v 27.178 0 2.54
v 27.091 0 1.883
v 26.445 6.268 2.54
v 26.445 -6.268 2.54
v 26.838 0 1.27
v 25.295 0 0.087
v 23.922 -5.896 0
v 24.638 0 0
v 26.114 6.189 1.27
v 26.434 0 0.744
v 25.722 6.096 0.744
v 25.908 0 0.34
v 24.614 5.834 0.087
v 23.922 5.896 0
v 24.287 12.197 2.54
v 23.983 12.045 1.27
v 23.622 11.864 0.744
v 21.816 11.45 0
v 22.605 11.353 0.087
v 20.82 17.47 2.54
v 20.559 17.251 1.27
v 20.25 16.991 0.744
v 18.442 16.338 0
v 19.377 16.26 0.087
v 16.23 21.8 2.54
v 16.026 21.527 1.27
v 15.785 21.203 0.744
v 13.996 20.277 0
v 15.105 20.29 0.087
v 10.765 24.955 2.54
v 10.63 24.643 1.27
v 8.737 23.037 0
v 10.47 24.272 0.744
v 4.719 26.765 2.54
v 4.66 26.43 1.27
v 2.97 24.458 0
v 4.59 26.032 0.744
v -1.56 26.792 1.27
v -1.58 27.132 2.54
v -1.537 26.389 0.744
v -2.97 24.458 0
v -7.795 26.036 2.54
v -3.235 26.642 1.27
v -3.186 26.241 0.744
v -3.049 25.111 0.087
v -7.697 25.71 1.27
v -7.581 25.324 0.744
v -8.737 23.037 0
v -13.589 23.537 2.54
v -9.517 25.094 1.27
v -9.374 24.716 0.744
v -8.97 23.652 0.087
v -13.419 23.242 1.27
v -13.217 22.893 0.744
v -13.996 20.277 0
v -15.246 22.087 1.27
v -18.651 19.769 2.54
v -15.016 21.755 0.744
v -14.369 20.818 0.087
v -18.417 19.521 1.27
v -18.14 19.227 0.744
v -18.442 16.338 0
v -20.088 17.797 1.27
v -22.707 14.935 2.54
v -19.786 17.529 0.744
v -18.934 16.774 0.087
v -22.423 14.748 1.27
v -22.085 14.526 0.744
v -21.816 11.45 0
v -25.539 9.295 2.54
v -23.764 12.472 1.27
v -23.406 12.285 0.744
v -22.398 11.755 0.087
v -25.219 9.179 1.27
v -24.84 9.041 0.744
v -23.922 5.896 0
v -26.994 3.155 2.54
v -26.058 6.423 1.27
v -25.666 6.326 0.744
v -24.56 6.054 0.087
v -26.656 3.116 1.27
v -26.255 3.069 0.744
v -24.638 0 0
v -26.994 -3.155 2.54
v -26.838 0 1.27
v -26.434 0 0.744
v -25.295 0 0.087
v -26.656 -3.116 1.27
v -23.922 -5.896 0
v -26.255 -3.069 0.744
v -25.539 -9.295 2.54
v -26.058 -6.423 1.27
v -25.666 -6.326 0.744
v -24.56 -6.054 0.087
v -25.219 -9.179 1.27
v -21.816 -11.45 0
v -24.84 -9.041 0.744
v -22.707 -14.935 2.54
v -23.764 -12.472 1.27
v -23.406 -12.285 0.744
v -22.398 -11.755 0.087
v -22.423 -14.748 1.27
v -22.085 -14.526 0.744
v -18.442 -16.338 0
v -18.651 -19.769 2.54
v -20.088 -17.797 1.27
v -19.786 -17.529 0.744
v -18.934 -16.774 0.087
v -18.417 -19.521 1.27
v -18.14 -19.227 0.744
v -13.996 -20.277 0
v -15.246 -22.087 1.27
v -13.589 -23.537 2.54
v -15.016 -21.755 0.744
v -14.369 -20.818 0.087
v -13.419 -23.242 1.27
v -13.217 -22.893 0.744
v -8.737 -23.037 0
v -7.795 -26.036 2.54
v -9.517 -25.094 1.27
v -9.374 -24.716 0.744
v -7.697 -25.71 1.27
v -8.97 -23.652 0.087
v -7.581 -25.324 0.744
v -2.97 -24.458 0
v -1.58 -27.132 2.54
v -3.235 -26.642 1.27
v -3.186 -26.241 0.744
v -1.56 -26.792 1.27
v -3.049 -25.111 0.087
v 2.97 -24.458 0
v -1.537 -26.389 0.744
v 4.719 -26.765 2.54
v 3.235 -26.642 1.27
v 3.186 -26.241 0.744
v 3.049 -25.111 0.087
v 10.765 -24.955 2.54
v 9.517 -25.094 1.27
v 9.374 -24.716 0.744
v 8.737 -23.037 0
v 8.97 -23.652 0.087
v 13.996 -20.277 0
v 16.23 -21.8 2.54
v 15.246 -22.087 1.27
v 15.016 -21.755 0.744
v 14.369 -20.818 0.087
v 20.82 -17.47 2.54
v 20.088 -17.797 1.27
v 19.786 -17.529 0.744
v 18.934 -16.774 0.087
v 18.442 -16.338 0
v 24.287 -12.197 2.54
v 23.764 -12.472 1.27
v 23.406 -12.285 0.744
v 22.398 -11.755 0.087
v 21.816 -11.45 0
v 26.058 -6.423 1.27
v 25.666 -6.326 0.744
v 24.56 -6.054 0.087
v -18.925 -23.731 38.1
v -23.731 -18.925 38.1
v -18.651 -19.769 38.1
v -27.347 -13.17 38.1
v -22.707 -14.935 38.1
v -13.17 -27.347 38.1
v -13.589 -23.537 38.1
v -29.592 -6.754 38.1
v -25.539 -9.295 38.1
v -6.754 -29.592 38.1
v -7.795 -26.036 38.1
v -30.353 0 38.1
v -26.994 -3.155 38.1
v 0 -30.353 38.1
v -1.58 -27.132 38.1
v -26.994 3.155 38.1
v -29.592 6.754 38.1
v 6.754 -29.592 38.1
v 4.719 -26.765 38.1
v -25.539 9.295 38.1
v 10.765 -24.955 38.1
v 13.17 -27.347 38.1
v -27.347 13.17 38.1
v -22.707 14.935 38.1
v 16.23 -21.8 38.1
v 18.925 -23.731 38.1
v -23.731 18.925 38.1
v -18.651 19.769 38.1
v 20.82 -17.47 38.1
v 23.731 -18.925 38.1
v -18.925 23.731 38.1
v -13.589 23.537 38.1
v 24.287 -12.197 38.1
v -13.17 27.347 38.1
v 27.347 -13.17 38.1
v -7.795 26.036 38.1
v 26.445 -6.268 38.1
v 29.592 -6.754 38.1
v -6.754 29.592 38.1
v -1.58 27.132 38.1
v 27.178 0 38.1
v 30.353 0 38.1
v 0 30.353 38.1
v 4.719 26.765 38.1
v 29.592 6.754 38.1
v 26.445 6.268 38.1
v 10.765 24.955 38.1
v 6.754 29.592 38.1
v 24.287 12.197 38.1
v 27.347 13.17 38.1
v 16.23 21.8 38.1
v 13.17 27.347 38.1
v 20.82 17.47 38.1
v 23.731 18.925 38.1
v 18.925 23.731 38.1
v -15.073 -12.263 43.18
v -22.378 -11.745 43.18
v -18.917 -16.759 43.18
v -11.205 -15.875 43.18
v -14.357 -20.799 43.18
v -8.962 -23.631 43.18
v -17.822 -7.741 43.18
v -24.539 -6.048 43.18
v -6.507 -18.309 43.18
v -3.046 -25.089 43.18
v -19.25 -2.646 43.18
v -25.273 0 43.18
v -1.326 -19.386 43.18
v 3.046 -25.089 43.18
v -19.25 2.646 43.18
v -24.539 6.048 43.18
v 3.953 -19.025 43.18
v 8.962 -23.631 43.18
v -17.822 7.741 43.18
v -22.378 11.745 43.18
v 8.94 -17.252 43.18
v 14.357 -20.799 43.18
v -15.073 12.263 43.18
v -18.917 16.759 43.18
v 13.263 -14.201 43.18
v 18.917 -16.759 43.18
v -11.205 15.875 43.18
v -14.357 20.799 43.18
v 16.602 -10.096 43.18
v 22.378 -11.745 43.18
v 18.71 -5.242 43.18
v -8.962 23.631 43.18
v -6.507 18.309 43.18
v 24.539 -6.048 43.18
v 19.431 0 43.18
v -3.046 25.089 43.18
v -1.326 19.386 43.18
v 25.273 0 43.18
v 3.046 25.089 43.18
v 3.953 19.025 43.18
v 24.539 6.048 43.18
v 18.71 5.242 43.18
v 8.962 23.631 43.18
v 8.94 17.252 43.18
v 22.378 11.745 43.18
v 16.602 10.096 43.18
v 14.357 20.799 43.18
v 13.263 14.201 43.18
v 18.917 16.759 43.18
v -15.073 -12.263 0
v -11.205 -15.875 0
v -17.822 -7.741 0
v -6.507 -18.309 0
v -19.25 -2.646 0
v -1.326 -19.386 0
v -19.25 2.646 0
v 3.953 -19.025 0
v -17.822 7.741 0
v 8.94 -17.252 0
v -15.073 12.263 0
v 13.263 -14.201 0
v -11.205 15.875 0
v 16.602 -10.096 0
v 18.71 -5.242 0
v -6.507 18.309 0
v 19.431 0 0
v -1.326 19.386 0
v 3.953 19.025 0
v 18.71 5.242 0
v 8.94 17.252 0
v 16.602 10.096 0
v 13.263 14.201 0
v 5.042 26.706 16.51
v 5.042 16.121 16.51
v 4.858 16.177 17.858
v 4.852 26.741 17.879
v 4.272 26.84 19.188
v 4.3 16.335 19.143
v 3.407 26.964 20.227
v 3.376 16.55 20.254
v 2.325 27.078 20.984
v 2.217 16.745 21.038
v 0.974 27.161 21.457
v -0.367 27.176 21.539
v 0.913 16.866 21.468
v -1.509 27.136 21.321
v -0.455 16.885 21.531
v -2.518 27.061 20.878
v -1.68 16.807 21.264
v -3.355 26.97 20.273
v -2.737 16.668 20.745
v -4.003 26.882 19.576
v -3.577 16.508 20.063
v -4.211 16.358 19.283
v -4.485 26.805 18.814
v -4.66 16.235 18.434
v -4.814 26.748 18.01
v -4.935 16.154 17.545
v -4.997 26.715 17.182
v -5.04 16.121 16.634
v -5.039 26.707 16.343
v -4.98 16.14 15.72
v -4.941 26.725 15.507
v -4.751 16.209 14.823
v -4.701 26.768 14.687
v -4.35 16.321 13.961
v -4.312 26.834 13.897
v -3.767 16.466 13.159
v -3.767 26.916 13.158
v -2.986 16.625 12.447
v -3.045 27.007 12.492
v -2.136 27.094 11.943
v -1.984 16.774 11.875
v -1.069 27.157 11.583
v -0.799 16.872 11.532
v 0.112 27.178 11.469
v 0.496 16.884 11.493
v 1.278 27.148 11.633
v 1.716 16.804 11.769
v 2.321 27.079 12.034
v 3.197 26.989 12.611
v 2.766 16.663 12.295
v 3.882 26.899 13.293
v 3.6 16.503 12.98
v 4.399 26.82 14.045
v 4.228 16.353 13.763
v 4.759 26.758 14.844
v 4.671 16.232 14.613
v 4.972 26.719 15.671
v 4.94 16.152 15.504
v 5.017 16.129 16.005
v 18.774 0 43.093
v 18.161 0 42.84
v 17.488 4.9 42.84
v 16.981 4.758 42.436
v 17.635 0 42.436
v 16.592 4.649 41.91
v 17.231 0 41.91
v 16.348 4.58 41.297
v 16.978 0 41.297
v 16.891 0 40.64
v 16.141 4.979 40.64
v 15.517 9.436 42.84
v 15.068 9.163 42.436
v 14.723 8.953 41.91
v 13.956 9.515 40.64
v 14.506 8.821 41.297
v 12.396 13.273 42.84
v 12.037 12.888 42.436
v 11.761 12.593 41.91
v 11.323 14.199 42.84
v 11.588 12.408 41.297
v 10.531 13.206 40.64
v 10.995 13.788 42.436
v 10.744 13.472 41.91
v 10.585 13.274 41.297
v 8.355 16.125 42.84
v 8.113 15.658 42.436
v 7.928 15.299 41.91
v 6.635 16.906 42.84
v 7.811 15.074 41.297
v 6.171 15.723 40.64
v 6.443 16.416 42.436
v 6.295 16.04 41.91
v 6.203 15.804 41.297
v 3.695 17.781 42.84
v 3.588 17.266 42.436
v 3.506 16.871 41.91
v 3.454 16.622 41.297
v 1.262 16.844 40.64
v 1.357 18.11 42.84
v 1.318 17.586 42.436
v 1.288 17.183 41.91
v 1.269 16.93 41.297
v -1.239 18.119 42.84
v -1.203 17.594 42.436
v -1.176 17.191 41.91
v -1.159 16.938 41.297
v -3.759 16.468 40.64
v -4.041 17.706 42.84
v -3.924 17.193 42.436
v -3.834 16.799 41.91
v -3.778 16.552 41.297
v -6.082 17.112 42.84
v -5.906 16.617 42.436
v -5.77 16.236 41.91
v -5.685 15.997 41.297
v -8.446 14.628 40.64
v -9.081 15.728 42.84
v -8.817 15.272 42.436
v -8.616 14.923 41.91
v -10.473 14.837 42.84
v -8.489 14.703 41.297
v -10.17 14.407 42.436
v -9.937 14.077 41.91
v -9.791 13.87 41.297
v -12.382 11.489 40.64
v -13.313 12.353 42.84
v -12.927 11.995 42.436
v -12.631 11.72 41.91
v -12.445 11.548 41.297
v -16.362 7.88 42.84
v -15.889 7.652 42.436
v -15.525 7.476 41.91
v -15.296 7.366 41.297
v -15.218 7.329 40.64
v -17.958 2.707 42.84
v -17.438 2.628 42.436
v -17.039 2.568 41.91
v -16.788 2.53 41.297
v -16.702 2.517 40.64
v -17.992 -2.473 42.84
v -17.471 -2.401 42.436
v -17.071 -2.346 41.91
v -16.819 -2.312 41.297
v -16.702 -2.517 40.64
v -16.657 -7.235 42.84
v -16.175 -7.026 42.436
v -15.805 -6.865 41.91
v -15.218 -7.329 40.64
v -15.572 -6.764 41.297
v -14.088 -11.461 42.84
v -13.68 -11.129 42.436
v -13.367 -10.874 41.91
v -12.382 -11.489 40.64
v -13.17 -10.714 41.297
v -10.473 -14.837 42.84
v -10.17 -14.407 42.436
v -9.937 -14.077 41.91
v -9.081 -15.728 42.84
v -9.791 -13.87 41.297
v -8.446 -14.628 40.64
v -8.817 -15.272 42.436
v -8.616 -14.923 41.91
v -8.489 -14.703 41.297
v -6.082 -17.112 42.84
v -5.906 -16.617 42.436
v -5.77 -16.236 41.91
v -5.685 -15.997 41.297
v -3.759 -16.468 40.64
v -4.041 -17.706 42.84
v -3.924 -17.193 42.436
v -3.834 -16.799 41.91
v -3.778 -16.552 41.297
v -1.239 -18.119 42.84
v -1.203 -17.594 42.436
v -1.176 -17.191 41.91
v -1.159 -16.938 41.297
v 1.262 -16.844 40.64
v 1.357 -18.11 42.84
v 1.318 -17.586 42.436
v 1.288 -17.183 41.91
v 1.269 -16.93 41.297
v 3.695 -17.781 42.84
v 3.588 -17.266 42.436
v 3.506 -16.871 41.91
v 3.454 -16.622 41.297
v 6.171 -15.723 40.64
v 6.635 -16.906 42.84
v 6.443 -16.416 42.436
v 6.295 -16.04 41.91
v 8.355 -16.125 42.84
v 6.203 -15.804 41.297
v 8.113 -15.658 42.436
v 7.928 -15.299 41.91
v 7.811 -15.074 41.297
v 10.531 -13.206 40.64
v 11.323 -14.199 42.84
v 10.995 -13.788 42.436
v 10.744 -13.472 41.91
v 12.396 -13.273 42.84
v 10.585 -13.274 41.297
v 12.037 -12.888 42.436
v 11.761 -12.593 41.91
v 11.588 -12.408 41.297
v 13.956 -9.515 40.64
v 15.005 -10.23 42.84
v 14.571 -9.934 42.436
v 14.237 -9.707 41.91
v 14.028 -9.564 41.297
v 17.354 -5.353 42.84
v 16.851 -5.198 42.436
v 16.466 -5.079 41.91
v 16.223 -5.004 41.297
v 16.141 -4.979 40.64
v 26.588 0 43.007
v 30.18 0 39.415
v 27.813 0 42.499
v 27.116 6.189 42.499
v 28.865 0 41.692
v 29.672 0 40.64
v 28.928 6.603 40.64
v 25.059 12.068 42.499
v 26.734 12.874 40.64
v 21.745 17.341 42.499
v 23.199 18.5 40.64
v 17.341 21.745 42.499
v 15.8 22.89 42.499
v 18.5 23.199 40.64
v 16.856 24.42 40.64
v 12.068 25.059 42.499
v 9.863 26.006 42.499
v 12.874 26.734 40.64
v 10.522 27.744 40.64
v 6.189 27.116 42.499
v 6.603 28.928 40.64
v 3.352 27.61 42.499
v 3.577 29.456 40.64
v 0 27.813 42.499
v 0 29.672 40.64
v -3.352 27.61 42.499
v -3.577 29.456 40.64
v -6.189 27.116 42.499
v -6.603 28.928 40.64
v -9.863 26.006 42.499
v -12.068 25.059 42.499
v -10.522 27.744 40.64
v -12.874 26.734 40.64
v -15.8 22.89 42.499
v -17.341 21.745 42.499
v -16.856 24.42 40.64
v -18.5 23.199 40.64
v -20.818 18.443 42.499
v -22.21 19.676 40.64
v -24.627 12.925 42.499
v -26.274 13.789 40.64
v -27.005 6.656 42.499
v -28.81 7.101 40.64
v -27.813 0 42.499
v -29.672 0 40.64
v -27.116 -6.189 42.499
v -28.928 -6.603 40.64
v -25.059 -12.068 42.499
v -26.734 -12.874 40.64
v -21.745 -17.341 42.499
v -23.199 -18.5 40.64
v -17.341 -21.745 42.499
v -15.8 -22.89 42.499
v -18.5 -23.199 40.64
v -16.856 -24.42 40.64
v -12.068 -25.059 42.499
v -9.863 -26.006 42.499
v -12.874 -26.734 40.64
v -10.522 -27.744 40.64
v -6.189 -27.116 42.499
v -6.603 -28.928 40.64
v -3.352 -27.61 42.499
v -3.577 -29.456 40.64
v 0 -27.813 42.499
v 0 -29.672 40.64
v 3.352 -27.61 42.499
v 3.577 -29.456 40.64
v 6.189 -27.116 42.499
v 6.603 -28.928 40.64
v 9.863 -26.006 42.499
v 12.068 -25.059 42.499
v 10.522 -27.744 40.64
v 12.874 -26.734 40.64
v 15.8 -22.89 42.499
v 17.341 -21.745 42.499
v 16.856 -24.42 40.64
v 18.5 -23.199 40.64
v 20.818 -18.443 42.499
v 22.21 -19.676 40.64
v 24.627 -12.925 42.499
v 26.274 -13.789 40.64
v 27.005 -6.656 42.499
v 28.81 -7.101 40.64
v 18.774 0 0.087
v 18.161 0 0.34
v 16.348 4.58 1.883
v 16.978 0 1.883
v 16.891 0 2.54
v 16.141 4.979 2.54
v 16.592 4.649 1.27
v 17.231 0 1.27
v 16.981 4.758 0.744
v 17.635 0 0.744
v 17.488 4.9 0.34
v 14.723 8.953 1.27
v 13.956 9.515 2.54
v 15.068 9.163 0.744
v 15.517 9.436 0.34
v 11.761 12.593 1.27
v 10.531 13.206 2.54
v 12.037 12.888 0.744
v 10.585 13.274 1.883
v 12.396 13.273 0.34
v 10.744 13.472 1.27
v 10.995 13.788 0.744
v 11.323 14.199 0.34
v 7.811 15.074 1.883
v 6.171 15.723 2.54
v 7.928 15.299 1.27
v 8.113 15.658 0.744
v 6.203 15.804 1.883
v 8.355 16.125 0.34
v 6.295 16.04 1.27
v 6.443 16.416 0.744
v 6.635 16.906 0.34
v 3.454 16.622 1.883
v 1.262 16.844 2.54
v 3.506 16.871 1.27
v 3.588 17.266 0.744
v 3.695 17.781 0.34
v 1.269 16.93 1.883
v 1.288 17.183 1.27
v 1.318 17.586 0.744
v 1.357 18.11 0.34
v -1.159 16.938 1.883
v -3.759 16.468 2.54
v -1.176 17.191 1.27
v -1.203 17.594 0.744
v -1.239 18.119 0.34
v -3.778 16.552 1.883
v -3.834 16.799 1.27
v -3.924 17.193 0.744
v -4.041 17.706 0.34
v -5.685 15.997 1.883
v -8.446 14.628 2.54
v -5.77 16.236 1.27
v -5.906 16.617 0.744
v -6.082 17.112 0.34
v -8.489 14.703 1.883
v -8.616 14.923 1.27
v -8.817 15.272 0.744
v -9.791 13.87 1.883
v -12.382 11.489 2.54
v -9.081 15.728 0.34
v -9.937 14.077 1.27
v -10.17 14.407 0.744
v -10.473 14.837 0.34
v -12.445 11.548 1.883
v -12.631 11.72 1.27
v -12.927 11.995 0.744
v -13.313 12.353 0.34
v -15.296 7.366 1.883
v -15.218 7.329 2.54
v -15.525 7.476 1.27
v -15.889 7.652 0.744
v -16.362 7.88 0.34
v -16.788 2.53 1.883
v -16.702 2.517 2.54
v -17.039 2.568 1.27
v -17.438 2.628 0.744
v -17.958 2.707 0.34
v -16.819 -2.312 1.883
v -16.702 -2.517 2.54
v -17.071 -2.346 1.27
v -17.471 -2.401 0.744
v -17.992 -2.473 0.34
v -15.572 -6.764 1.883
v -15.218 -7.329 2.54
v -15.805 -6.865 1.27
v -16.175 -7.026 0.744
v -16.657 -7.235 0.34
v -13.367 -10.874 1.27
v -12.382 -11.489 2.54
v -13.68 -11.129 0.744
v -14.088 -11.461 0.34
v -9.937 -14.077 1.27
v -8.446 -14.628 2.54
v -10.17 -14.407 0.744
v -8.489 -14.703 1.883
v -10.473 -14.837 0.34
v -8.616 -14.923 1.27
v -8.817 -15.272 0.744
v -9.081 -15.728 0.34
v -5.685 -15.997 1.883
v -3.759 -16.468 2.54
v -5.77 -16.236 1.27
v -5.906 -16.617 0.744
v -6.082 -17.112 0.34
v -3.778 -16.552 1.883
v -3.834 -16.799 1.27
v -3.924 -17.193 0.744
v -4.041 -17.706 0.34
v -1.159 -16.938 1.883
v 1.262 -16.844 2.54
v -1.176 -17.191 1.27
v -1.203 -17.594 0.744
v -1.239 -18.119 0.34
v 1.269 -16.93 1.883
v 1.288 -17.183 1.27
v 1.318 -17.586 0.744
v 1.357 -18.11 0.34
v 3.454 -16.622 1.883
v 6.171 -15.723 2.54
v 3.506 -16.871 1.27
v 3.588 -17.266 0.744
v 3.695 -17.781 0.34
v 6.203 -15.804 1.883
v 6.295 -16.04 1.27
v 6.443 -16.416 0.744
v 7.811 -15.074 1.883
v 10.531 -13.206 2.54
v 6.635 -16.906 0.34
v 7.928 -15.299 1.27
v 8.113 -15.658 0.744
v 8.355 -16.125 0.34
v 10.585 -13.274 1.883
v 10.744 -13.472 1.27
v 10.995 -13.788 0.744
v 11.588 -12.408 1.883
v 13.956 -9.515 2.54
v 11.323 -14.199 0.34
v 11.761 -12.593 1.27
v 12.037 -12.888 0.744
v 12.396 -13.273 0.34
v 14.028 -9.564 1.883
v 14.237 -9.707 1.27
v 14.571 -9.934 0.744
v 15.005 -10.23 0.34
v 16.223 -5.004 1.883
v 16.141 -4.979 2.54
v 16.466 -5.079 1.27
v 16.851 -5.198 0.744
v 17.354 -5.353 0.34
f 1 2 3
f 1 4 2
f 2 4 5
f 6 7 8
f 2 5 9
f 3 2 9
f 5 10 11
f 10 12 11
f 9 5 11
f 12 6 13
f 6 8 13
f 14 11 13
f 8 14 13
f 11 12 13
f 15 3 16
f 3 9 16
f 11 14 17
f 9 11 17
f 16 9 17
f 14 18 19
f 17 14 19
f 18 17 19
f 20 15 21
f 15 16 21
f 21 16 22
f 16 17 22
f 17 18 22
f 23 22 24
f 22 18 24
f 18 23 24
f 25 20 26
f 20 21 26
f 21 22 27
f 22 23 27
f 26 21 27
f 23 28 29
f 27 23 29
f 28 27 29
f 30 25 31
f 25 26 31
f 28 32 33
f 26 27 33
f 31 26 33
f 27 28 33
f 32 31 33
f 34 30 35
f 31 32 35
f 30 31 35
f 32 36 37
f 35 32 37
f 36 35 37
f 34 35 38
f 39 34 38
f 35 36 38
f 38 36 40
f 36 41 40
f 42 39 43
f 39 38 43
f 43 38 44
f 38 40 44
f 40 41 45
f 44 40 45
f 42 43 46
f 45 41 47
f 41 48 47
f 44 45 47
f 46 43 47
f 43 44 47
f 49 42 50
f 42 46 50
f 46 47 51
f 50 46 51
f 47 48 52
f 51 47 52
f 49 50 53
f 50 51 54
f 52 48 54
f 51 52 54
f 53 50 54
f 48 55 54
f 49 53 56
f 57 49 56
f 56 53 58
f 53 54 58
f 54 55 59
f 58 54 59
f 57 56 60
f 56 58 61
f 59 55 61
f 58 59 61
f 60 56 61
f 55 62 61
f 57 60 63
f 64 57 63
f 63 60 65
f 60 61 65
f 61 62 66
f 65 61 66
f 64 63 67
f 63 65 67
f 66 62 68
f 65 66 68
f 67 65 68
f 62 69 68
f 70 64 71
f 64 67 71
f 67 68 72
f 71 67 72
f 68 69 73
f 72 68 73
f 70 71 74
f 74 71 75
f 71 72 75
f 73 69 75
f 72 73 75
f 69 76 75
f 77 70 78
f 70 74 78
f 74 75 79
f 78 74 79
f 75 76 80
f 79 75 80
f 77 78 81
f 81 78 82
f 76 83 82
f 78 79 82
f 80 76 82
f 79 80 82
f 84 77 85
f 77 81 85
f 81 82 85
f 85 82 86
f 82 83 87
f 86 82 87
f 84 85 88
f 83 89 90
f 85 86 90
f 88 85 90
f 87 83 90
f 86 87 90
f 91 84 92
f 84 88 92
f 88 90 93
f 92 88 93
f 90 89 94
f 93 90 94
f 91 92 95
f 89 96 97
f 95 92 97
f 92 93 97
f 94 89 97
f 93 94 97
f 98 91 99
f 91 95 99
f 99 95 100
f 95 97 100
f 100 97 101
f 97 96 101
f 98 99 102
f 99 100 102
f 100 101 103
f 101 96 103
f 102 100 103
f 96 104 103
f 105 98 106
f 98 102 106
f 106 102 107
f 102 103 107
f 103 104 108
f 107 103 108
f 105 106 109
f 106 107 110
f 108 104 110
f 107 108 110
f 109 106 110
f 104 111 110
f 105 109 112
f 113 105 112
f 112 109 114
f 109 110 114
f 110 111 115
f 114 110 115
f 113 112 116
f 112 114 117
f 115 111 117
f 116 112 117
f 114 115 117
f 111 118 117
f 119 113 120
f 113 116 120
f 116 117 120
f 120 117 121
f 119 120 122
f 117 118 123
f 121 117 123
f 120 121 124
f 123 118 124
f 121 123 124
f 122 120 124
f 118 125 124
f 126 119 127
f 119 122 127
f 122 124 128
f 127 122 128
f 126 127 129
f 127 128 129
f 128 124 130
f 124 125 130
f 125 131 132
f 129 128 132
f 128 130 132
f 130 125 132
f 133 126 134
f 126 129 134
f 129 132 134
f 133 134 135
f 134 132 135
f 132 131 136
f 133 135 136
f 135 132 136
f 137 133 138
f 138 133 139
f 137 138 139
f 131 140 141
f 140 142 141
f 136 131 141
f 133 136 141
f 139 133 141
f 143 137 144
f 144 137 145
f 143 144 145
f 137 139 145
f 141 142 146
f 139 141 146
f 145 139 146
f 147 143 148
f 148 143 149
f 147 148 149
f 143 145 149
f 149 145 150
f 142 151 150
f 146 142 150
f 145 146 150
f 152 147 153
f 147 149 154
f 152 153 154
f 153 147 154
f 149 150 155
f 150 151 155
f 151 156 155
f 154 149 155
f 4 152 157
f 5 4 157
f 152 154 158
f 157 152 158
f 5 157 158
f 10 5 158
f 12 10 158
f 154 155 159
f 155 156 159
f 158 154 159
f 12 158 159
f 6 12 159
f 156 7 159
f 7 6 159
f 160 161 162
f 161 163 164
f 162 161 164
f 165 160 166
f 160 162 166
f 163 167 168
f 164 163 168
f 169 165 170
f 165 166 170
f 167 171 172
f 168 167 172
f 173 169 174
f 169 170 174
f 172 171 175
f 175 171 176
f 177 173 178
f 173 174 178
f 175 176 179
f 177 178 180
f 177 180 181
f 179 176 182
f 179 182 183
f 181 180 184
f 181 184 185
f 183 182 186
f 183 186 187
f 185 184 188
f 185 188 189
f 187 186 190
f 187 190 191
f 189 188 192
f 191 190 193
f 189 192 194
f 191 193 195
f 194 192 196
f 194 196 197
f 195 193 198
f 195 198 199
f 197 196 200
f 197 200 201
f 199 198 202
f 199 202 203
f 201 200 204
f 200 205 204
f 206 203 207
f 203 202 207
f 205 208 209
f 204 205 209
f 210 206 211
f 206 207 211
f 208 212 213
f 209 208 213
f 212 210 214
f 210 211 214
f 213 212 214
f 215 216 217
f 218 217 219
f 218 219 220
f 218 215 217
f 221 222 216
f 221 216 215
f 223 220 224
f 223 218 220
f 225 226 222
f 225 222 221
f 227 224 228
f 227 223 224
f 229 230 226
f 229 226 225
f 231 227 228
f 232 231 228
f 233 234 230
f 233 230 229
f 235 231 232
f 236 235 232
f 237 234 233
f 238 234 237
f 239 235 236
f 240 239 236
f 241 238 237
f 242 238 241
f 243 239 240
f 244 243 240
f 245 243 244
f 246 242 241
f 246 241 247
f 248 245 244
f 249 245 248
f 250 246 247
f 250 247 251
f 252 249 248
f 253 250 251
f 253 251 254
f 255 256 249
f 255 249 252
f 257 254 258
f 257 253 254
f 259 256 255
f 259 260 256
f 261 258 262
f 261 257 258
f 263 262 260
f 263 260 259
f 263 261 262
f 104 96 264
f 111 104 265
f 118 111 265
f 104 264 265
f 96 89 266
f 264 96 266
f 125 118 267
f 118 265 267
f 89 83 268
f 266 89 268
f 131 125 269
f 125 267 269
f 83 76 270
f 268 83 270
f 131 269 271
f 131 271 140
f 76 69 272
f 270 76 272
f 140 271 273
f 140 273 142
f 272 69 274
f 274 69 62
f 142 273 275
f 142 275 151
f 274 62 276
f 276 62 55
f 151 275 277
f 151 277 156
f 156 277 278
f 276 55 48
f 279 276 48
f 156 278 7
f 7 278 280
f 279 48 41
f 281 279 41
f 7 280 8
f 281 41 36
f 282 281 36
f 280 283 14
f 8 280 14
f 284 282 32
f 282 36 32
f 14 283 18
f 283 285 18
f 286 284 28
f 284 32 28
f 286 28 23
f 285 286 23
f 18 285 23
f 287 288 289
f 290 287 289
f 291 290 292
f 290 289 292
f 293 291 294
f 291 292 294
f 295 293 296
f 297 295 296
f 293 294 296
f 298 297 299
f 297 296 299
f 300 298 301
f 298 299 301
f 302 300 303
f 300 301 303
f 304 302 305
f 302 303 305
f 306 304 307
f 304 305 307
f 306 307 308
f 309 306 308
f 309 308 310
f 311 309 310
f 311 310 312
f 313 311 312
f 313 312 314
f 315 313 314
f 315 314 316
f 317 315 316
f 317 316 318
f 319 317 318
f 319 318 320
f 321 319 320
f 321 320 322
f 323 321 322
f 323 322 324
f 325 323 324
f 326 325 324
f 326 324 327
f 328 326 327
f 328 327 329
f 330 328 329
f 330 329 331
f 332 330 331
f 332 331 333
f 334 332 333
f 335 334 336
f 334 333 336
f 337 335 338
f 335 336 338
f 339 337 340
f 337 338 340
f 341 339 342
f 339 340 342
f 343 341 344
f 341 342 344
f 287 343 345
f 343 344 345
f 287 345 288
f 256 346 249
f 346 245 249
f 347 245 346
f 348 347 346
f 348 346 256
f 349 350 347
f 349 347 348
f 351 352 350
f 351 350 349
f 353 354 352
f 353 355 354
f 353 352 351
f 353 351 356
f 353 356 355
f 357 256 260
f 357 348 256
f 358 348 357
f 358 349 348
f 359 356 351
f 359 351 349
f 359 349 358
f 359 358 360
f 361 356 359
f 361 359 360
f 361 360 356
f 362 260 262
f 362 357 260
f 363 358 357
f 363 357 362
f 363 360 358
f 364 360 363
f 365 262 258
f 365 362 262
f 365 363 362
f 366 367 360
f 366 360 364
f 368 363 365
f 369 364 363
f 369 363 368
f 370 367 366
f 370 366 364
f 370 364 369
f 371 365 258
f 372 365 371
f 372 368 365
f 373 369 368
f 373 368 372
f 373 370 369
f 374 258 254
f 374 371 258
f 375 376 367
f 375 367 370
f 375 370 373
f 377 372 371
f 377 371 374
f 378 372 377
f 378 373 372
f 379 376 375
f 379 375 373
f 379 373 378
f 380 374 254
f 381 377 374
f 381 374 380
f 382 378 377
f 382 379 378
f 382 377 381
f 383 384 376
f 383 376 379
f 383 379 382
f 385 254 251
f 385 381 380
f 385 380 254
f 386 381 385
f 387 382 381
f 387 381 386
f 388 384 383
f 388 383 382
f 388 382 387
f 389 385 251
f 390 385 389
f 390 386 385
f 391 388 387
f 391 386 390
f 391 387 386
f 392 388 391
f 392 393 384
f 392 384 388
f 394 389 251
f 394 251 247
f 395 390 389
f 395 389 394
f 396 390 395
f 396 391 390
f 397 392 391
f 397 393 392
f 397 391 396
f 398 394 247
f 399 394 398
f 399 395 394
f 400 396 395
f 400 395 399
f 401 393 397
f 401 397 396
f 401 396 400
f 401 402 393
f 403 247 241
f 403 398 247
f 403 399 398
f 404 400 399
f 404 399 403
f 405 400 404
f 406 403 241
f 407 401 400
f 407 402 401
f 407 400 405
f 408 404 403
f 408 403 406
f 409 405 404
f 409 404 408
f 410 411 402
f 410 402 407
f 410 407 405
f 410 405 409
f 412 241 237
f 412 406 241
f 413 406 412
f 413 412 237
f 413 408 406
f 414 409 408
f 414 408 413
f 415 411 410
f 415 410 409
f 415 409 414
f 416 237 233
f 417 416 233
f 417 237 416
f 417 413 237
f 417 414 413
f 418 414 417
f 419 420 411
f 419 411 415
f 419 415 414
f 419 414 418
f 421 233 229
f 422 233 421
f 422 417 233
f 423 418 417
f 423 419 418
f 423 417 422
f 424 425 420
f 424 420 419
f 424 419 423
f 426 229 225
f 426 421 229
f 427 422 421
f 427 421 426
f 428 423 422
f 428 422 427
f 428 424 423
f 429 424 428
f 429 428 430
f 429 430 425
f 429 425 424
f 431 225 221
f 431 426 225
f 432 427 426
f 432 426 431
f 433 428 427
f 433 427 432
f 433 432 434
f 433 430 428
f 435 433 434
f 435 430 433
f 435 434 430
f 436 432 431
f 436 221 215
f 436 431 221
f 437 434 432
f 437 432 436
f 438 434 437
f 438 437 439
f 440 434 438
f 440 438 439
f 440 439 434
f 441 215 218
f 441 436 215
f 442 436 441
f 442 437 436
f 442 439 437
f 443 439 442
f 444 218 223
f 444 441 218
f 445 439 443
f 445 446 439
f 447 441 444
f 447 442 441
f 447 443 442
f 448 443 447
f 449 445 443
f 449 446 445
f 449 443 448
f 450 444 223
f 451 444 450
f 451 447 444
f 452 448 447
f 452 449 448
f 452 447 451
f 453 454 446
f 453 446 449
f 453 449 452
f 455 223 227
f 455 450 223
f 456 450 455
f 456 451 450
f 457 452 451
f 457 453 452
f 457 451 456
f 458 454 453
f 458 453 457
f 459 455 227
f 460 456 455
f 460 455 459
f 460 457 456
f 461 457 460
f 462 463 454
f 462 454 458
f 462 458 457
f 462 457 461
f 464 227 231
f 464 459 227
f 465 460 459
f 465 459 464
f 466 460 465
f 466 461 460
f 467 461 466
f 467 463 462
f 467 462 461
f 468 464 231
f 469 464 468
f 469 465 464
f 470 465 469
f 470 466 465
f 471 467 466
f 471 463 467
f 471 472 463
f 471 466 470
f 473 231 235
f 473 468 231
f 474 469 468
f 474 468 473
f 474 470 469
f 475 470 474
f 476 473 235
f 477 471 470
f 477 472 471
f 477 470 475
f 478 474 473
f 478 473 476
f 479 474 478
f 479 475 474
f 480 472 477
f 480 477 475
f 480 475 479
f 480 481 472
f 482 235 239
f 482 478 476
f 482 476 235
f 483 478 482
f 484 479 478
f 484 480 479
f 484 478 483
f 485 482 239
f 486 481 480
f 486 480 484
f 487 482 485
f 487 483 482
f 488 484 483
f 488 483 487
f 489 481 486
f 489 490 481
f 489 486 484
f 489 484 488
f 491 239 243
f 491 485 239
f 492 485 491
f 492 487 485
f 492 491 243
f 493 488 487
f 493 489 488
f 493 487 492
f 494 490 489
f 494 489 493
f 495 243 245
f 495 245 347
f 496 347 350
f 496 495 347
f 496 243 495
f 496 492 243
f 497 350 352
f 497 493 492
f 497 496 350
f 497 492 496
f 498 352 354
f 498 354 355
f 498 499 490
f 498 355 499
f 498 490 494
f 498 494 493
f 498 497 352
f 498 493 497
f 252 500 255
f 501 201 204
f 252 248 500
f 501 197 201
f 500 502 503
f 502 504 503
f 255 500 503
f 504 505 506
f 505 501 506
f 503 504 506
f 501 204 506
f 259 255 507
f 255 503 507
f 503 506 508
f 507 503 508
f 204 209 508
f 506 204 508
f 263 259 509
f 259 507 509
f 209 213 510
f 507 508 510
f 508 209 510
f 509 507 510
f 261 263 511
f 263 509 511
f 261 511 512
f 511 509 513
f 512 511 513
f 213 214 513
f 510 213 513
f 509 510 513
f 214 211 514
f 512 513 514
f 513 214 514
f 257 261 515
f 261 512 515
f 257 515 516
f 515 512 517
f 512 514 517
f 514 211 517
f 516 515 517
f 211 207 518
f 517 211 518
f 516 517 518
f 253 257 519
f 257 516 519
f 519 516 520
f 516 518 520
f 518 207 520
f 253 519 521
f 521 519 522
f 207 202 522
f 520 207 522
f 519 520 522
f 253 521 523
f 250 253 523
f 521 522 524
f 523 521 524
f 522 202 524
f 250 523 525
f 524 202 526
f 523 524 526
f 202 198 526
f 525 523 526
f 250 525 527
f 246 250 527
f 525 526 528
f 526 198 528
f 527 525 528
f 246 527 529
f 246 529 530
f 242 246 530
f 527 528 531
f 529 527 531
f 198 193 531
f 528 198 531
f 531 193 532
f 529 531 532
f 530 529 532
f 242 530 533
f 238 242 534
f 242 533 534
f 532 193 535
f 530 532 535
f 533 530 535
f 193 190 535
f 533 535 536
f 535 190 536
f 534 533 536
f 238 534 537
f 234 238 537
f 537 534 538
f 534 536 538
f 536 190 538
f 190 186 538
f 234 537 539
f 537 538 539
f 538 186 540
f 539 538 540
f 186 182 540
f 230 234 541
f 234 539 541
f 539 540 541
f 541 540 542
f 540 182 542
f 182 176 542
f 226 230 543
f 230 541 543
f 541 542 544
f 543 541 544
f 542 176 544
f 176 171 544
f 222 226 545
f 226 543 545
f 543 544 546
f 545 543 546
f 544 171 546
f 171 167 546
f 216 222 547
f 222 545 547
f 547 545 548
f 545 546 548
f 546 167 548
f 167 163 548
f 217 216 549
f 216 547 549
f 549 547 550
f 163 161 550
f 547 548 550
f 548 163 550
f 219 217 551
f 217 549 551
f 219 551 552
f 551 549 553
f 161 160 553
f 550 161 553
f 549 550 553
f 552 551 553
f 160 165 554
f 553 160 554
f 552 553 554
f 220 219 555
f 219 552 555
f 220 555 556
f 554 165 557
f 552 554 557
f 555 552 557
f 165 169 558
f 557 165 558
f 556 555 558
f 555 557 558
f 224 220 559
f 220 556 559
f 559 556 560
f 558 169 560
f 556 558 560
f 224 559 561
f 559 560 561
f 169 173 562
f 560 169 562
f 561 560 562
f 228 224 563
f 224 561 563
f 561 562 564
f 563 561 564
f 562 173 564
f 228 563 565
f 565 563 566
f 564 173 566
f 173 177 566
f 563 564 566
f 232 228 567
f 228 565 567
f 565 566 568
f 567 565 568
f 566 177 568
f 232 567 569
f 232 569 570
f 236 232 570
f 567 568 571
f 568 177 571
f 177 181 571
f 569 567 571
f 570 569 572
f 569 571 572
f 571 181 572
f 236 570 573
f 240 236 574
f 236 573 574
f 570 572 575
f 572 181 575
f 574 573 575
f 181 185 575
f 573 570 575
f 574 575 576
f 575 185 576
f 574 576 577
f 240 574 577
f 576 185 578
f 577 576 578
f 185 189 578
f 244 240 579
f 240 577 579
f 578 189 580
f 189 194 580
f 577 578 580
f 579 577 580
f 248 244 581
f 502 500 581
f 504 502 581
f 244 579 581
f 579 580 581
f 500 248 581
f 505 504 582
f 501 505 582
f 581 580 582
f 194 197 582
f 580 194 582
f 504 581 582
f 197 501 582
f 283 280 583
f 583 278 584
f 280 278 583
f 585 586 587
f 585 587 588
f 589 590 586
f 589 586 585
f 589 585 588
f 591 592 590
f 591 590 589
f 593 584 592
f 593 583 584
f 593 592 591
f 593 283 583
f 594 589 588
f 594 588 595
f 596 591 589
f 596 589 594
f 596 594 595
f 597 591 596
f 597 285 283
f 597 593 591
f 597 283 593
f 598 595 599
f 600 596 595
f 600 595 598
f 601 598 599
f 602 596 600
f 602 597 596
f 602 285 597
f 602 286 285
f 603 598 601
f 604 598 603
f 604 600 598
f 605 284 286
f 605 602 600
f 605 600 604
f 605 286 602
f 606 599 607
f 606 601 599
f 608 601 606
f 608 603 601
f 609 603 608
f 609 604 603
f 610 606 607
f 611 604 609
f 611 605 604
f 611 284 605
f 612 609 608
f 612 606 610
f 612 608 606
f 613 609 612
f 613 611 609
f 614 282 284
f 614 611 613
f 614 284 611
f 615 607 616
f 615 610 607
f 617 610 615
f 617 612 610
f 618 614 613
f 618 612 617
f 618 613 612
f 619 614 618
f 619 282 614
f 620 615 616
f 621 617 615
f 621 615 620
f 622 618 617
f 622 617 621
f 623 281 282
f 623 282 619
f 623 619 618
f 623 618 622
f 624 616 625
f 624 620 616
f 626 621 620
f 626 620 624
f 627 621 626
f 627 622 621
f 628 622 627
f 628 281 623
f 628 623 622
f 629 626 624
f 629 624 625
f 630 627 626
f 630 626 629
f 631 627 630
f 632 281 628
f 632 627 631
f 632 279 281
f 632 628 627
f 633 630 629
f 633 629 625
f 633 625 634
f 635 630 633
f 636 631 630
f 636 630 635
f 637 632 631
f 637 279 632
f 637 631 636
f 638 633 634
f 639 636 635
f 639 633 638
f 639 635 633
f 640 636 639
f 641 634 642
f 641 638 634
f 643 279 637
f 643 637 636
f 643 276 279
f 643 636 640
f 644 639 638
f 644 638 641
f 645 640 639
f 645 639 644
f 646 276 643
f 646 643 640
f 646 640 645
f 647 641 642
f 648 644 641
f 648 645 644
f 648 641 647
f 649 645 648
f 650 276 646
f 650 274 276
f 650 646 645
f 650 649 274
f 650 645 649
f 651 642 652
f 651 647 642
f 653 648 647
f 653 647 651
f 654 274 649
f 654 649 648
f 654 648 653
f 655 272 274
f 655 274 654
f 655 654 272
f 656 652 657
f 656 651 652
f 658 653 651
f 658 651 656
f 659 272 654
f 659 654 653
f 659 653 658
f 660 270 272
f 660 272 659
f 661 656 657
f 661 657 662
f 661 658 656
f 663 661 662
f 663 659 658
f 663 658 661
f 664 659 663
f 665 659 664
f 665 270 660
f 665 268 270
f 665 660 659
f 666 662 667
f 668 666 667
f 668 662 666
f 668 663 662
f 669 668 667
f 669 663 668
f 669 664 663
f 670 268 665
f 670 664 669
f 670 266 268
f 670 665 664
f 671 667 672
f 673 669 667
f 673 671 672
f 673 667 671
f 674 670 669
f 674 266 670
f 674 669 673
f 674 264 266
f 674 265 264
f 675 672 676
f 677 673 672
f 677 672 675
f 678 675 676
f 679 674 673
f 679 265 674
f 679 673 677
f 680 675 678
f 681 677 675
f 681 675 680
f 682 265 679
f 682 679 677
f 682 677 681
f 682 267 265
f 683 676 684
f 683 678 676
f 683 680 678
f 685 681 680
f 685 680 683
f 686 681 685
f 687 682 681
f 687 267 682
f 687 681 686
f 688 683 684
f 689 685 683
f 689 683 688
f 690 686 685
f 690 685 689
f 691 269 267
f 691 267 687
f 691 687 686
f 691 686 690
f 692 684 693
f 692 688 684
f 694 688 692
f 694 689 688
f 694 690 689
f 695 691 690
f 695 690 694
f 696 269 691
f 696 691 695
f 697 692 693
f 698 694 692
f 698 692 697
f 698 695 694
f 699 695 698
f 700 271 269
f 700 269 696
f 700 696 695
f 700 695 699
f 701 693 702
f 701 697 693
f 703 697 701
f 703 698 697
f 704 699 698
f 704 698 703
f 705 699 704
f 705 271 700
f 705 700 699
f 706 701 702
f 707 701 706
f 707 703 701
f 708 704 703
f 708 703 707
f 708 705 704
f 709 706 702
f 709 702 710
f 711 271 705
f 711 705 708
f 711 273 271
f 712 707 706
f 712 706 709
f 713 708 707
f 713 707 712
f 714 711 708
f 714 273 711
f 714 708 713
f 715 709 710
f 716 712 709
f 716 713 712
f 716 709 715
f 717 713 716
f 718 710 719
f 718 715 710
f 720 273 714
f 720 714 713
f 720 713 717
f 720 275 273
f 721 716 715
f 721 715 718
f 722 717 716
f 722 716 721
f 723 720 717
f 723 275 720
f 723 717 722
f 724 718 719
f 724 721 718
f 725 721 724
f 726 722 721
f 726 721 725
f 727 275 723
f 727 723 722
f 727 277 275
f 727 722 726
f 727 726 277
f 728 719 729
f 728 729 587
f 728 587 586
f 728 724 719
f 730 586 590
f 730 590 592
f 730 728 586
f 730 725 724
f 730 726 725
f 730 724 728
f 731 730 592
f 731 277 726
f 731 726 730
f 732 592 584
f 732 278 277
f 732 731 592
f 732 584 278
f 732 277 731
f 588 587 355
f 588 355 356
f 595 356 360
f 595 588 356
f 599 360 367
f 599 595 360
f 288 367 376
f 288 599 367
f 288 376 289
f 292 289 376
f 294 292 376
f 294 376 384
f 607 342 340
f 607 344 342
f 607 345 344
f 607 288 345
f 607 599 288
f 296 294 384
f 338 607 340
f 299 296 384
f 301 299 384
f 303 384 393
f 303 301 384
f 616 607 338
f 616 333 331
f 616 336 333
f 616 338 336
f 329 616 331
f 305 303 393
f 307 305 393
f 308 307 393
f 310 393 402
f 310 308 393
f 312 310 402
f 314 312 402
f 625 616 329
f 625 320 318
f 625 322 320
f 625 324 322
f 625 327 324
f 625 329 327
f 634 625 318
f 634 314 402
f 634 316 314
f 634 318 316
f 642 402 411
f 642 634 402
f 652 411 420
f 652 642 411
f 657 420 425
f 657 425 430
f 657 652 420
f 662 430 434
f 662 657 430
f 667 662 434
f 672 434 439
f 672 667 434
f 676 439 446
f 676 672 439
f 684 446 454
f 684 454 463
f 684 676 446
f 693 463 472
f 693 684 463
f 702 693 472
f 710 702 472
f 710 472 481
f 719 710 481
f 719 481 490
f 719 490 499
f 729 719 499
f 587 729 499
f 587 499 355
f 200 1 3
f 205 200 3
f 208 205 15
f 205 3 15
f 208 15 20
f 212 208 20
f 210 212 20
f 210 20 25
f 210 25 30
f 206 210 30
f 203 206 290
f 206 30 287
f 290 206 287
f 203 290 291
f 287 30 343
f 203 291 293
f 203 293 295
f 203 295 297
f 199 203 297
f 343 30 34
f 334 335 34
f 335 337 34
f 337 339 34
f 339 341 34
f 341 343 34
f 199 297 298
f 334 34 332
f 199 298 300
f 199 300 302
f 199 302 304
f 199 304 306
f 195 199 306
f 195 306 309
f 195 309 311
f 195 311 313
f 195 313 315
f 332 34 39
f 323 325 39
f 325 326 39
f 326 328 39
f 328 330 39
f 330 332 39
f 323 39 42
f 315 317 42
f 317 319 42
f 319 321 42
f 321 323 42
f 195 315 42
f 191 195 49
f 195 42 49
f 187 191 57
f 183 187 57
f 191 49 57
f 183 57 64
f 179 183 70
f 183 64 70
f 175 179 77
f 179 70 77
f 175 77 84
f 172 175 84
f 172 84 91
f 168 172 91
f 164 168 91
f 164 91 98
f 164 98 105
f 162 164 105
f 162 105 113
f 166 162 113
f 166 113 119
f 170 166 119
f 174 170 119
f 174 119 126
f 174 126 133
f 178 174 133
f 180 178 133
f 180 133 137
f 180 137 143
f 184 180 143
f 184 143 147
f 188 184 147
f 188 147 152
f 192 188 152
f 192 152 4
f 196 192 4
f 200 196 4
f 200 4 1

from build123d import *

# Parameters (mm, degrees)
F0_R     = 27.178
F0_R_2   = 16.891
F1_DEPTH = 38.1
F2_R     = 30.353
F2_R_2   = 27.178
F2_R_3   = 16.891
F3_DEPTH = 5.08
F5_D     = 10.0838
F5_DEPTH = 30.354
F6_R     = 2.54
F7_R     = 5.07999


# Not quite as in the source:
# - a fillet or chamfer is up to 0.001 mm smaller than in the source, because OpenCascade refuses the exact size


with BuildPart() as f1:
    # F0 (on Top) → F1 (new body)
    with BuildSketch(Plane.XY):
        Circle(F0_R)
        Circle(F0_R_2, mode=Mode.SUBTRACT)
    extrude(amount=F1_DEPTH)

    # F2 (on face) → F3 (join)
    with BuildSketch(Plane.XY.offset(38.1)):
        Circle(F2_R)
        Circle(F2_R_2, mode=Mode.SUBTRACT)
        Circle(F2_R_2)
        Circle(F2_R_3, mode=Mode.SUBTRACT)
    extrude(amount=F3_DEPTH)

    # F5 (through all, one way)
    with BuildSketch(Plane.XZ):
        with Locations((0, 16.51)):
            Circle(F5_D / 2)
    extrude(amount=-F5_DEPTH, mode=Mode.SUBTRACT)

    # F6
    f6_edges = [f1.edges().sort_by_distance(p)[0] for p in [
        (-16.891, 0, 0),
        (-27.178, 0, 0),
        (-16.891, 0, 43.18),
    ]]
    fillet(f6_edges, radius=F6_R)

    # F7 (radius 5.08 in the source; OpenCascade refuses exactly that, so slightly less here)
    f7_edges = [f1.edges().sort_by_distance(p)[0] for p in [
        (-30.353, 0, 43.18),
    ]]
    fillet(f7_edges, radius=F7_R)


solid = f1.part
